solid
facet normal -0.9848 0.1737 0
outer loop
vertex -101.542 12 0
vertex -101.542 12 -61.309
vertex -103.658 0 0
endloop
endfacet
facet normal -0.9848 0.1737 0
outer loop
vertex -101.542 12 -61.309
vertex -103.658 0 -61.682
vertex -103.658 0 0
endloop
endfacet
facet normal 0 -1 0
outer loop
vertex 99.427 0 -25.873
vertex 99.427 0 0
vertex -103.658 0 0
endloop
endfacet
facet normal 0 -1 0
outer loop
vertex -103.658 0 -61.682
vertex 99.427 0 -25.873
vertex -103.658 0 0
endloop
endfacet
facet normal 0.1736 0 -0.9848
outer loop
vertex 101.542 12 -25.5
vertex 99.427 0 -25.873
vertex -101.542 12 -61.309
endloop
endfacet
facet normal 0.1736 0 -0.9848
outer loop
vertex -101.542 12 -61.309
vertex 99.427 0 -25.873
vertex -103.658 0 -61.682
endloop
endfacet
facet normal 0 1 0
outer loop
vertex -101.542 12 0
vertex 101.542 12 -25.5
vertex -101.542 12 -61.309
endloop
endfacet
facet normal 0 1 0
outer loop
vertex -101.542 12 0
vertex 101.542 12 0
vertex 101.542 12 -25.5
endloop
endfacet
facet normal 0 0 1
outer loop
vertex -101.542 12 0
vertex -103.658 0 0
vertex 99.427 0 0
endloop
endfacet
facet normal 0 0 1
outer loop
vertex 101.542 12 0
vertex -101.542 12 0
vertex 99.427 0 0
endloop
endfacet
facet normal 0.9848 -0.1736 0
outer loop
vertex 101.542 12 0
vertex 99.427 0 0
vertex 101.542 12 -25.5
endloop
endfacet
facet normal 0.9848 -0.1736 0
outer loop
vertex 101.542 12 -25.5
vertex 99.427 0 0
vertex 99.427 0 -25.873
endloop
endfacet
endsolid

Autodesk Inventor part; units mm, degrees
ref_plane "Work Plane1" through (99.4266, 0, -12.9365) normal (0.9848078, -0.1736482, 0) x (0, 0, -1)
ref_plane "Work Plane2" through (-102.6005, 6, 0) normal (0, 0, 1) x (1, 0, 0)
ref_plane "Work Plane3" through (-101.5425, 12, -61.3094) normal (0.1735668, -0.0306045, -0.9843464) x (0.9848078, 0, 0.1736482)
sketch "Sketch1" plane through (0, 0, 0) normal (0, 1, 0) x (-1, 0, 0)
  line L0 (101.5425, -61.3094) -> (101.5425, 0)
  line L1 (101.5425, 0) -> (-101.5425, 0)
  line L2 (-101.5425, 0) -> (-101.5425, -25.5)
  line L3 (-101.5425, -25.5) -> (101.5425, -61.3094)
  point P0 (0, 0)
  point P1 (0, 0)
  dimension "d0" = 100
  dimension "d1" = 25.5
  dimension "d5" = 203.085
  dimension "d15" = 25.5
  dimension "d16" = 156.1695
extrude "Extrusion1" add sketch "Sketch1" along normal blind 12
draft "FaceDraft2" angle 10 pull direction (0, -1, 0) faces at (101.5425, 4, -8.5) fixed edges at (101.5425, 12, -12.75)
draft "FaceDraft3" angle -10 pull direction (0, -1, 0) faces at (-101.5425, 4, -40.8729) fixed edges at (-101.5425, 12, -30.6547)
equation "\"d15\" = d1"
properties part number "Panel_side"
